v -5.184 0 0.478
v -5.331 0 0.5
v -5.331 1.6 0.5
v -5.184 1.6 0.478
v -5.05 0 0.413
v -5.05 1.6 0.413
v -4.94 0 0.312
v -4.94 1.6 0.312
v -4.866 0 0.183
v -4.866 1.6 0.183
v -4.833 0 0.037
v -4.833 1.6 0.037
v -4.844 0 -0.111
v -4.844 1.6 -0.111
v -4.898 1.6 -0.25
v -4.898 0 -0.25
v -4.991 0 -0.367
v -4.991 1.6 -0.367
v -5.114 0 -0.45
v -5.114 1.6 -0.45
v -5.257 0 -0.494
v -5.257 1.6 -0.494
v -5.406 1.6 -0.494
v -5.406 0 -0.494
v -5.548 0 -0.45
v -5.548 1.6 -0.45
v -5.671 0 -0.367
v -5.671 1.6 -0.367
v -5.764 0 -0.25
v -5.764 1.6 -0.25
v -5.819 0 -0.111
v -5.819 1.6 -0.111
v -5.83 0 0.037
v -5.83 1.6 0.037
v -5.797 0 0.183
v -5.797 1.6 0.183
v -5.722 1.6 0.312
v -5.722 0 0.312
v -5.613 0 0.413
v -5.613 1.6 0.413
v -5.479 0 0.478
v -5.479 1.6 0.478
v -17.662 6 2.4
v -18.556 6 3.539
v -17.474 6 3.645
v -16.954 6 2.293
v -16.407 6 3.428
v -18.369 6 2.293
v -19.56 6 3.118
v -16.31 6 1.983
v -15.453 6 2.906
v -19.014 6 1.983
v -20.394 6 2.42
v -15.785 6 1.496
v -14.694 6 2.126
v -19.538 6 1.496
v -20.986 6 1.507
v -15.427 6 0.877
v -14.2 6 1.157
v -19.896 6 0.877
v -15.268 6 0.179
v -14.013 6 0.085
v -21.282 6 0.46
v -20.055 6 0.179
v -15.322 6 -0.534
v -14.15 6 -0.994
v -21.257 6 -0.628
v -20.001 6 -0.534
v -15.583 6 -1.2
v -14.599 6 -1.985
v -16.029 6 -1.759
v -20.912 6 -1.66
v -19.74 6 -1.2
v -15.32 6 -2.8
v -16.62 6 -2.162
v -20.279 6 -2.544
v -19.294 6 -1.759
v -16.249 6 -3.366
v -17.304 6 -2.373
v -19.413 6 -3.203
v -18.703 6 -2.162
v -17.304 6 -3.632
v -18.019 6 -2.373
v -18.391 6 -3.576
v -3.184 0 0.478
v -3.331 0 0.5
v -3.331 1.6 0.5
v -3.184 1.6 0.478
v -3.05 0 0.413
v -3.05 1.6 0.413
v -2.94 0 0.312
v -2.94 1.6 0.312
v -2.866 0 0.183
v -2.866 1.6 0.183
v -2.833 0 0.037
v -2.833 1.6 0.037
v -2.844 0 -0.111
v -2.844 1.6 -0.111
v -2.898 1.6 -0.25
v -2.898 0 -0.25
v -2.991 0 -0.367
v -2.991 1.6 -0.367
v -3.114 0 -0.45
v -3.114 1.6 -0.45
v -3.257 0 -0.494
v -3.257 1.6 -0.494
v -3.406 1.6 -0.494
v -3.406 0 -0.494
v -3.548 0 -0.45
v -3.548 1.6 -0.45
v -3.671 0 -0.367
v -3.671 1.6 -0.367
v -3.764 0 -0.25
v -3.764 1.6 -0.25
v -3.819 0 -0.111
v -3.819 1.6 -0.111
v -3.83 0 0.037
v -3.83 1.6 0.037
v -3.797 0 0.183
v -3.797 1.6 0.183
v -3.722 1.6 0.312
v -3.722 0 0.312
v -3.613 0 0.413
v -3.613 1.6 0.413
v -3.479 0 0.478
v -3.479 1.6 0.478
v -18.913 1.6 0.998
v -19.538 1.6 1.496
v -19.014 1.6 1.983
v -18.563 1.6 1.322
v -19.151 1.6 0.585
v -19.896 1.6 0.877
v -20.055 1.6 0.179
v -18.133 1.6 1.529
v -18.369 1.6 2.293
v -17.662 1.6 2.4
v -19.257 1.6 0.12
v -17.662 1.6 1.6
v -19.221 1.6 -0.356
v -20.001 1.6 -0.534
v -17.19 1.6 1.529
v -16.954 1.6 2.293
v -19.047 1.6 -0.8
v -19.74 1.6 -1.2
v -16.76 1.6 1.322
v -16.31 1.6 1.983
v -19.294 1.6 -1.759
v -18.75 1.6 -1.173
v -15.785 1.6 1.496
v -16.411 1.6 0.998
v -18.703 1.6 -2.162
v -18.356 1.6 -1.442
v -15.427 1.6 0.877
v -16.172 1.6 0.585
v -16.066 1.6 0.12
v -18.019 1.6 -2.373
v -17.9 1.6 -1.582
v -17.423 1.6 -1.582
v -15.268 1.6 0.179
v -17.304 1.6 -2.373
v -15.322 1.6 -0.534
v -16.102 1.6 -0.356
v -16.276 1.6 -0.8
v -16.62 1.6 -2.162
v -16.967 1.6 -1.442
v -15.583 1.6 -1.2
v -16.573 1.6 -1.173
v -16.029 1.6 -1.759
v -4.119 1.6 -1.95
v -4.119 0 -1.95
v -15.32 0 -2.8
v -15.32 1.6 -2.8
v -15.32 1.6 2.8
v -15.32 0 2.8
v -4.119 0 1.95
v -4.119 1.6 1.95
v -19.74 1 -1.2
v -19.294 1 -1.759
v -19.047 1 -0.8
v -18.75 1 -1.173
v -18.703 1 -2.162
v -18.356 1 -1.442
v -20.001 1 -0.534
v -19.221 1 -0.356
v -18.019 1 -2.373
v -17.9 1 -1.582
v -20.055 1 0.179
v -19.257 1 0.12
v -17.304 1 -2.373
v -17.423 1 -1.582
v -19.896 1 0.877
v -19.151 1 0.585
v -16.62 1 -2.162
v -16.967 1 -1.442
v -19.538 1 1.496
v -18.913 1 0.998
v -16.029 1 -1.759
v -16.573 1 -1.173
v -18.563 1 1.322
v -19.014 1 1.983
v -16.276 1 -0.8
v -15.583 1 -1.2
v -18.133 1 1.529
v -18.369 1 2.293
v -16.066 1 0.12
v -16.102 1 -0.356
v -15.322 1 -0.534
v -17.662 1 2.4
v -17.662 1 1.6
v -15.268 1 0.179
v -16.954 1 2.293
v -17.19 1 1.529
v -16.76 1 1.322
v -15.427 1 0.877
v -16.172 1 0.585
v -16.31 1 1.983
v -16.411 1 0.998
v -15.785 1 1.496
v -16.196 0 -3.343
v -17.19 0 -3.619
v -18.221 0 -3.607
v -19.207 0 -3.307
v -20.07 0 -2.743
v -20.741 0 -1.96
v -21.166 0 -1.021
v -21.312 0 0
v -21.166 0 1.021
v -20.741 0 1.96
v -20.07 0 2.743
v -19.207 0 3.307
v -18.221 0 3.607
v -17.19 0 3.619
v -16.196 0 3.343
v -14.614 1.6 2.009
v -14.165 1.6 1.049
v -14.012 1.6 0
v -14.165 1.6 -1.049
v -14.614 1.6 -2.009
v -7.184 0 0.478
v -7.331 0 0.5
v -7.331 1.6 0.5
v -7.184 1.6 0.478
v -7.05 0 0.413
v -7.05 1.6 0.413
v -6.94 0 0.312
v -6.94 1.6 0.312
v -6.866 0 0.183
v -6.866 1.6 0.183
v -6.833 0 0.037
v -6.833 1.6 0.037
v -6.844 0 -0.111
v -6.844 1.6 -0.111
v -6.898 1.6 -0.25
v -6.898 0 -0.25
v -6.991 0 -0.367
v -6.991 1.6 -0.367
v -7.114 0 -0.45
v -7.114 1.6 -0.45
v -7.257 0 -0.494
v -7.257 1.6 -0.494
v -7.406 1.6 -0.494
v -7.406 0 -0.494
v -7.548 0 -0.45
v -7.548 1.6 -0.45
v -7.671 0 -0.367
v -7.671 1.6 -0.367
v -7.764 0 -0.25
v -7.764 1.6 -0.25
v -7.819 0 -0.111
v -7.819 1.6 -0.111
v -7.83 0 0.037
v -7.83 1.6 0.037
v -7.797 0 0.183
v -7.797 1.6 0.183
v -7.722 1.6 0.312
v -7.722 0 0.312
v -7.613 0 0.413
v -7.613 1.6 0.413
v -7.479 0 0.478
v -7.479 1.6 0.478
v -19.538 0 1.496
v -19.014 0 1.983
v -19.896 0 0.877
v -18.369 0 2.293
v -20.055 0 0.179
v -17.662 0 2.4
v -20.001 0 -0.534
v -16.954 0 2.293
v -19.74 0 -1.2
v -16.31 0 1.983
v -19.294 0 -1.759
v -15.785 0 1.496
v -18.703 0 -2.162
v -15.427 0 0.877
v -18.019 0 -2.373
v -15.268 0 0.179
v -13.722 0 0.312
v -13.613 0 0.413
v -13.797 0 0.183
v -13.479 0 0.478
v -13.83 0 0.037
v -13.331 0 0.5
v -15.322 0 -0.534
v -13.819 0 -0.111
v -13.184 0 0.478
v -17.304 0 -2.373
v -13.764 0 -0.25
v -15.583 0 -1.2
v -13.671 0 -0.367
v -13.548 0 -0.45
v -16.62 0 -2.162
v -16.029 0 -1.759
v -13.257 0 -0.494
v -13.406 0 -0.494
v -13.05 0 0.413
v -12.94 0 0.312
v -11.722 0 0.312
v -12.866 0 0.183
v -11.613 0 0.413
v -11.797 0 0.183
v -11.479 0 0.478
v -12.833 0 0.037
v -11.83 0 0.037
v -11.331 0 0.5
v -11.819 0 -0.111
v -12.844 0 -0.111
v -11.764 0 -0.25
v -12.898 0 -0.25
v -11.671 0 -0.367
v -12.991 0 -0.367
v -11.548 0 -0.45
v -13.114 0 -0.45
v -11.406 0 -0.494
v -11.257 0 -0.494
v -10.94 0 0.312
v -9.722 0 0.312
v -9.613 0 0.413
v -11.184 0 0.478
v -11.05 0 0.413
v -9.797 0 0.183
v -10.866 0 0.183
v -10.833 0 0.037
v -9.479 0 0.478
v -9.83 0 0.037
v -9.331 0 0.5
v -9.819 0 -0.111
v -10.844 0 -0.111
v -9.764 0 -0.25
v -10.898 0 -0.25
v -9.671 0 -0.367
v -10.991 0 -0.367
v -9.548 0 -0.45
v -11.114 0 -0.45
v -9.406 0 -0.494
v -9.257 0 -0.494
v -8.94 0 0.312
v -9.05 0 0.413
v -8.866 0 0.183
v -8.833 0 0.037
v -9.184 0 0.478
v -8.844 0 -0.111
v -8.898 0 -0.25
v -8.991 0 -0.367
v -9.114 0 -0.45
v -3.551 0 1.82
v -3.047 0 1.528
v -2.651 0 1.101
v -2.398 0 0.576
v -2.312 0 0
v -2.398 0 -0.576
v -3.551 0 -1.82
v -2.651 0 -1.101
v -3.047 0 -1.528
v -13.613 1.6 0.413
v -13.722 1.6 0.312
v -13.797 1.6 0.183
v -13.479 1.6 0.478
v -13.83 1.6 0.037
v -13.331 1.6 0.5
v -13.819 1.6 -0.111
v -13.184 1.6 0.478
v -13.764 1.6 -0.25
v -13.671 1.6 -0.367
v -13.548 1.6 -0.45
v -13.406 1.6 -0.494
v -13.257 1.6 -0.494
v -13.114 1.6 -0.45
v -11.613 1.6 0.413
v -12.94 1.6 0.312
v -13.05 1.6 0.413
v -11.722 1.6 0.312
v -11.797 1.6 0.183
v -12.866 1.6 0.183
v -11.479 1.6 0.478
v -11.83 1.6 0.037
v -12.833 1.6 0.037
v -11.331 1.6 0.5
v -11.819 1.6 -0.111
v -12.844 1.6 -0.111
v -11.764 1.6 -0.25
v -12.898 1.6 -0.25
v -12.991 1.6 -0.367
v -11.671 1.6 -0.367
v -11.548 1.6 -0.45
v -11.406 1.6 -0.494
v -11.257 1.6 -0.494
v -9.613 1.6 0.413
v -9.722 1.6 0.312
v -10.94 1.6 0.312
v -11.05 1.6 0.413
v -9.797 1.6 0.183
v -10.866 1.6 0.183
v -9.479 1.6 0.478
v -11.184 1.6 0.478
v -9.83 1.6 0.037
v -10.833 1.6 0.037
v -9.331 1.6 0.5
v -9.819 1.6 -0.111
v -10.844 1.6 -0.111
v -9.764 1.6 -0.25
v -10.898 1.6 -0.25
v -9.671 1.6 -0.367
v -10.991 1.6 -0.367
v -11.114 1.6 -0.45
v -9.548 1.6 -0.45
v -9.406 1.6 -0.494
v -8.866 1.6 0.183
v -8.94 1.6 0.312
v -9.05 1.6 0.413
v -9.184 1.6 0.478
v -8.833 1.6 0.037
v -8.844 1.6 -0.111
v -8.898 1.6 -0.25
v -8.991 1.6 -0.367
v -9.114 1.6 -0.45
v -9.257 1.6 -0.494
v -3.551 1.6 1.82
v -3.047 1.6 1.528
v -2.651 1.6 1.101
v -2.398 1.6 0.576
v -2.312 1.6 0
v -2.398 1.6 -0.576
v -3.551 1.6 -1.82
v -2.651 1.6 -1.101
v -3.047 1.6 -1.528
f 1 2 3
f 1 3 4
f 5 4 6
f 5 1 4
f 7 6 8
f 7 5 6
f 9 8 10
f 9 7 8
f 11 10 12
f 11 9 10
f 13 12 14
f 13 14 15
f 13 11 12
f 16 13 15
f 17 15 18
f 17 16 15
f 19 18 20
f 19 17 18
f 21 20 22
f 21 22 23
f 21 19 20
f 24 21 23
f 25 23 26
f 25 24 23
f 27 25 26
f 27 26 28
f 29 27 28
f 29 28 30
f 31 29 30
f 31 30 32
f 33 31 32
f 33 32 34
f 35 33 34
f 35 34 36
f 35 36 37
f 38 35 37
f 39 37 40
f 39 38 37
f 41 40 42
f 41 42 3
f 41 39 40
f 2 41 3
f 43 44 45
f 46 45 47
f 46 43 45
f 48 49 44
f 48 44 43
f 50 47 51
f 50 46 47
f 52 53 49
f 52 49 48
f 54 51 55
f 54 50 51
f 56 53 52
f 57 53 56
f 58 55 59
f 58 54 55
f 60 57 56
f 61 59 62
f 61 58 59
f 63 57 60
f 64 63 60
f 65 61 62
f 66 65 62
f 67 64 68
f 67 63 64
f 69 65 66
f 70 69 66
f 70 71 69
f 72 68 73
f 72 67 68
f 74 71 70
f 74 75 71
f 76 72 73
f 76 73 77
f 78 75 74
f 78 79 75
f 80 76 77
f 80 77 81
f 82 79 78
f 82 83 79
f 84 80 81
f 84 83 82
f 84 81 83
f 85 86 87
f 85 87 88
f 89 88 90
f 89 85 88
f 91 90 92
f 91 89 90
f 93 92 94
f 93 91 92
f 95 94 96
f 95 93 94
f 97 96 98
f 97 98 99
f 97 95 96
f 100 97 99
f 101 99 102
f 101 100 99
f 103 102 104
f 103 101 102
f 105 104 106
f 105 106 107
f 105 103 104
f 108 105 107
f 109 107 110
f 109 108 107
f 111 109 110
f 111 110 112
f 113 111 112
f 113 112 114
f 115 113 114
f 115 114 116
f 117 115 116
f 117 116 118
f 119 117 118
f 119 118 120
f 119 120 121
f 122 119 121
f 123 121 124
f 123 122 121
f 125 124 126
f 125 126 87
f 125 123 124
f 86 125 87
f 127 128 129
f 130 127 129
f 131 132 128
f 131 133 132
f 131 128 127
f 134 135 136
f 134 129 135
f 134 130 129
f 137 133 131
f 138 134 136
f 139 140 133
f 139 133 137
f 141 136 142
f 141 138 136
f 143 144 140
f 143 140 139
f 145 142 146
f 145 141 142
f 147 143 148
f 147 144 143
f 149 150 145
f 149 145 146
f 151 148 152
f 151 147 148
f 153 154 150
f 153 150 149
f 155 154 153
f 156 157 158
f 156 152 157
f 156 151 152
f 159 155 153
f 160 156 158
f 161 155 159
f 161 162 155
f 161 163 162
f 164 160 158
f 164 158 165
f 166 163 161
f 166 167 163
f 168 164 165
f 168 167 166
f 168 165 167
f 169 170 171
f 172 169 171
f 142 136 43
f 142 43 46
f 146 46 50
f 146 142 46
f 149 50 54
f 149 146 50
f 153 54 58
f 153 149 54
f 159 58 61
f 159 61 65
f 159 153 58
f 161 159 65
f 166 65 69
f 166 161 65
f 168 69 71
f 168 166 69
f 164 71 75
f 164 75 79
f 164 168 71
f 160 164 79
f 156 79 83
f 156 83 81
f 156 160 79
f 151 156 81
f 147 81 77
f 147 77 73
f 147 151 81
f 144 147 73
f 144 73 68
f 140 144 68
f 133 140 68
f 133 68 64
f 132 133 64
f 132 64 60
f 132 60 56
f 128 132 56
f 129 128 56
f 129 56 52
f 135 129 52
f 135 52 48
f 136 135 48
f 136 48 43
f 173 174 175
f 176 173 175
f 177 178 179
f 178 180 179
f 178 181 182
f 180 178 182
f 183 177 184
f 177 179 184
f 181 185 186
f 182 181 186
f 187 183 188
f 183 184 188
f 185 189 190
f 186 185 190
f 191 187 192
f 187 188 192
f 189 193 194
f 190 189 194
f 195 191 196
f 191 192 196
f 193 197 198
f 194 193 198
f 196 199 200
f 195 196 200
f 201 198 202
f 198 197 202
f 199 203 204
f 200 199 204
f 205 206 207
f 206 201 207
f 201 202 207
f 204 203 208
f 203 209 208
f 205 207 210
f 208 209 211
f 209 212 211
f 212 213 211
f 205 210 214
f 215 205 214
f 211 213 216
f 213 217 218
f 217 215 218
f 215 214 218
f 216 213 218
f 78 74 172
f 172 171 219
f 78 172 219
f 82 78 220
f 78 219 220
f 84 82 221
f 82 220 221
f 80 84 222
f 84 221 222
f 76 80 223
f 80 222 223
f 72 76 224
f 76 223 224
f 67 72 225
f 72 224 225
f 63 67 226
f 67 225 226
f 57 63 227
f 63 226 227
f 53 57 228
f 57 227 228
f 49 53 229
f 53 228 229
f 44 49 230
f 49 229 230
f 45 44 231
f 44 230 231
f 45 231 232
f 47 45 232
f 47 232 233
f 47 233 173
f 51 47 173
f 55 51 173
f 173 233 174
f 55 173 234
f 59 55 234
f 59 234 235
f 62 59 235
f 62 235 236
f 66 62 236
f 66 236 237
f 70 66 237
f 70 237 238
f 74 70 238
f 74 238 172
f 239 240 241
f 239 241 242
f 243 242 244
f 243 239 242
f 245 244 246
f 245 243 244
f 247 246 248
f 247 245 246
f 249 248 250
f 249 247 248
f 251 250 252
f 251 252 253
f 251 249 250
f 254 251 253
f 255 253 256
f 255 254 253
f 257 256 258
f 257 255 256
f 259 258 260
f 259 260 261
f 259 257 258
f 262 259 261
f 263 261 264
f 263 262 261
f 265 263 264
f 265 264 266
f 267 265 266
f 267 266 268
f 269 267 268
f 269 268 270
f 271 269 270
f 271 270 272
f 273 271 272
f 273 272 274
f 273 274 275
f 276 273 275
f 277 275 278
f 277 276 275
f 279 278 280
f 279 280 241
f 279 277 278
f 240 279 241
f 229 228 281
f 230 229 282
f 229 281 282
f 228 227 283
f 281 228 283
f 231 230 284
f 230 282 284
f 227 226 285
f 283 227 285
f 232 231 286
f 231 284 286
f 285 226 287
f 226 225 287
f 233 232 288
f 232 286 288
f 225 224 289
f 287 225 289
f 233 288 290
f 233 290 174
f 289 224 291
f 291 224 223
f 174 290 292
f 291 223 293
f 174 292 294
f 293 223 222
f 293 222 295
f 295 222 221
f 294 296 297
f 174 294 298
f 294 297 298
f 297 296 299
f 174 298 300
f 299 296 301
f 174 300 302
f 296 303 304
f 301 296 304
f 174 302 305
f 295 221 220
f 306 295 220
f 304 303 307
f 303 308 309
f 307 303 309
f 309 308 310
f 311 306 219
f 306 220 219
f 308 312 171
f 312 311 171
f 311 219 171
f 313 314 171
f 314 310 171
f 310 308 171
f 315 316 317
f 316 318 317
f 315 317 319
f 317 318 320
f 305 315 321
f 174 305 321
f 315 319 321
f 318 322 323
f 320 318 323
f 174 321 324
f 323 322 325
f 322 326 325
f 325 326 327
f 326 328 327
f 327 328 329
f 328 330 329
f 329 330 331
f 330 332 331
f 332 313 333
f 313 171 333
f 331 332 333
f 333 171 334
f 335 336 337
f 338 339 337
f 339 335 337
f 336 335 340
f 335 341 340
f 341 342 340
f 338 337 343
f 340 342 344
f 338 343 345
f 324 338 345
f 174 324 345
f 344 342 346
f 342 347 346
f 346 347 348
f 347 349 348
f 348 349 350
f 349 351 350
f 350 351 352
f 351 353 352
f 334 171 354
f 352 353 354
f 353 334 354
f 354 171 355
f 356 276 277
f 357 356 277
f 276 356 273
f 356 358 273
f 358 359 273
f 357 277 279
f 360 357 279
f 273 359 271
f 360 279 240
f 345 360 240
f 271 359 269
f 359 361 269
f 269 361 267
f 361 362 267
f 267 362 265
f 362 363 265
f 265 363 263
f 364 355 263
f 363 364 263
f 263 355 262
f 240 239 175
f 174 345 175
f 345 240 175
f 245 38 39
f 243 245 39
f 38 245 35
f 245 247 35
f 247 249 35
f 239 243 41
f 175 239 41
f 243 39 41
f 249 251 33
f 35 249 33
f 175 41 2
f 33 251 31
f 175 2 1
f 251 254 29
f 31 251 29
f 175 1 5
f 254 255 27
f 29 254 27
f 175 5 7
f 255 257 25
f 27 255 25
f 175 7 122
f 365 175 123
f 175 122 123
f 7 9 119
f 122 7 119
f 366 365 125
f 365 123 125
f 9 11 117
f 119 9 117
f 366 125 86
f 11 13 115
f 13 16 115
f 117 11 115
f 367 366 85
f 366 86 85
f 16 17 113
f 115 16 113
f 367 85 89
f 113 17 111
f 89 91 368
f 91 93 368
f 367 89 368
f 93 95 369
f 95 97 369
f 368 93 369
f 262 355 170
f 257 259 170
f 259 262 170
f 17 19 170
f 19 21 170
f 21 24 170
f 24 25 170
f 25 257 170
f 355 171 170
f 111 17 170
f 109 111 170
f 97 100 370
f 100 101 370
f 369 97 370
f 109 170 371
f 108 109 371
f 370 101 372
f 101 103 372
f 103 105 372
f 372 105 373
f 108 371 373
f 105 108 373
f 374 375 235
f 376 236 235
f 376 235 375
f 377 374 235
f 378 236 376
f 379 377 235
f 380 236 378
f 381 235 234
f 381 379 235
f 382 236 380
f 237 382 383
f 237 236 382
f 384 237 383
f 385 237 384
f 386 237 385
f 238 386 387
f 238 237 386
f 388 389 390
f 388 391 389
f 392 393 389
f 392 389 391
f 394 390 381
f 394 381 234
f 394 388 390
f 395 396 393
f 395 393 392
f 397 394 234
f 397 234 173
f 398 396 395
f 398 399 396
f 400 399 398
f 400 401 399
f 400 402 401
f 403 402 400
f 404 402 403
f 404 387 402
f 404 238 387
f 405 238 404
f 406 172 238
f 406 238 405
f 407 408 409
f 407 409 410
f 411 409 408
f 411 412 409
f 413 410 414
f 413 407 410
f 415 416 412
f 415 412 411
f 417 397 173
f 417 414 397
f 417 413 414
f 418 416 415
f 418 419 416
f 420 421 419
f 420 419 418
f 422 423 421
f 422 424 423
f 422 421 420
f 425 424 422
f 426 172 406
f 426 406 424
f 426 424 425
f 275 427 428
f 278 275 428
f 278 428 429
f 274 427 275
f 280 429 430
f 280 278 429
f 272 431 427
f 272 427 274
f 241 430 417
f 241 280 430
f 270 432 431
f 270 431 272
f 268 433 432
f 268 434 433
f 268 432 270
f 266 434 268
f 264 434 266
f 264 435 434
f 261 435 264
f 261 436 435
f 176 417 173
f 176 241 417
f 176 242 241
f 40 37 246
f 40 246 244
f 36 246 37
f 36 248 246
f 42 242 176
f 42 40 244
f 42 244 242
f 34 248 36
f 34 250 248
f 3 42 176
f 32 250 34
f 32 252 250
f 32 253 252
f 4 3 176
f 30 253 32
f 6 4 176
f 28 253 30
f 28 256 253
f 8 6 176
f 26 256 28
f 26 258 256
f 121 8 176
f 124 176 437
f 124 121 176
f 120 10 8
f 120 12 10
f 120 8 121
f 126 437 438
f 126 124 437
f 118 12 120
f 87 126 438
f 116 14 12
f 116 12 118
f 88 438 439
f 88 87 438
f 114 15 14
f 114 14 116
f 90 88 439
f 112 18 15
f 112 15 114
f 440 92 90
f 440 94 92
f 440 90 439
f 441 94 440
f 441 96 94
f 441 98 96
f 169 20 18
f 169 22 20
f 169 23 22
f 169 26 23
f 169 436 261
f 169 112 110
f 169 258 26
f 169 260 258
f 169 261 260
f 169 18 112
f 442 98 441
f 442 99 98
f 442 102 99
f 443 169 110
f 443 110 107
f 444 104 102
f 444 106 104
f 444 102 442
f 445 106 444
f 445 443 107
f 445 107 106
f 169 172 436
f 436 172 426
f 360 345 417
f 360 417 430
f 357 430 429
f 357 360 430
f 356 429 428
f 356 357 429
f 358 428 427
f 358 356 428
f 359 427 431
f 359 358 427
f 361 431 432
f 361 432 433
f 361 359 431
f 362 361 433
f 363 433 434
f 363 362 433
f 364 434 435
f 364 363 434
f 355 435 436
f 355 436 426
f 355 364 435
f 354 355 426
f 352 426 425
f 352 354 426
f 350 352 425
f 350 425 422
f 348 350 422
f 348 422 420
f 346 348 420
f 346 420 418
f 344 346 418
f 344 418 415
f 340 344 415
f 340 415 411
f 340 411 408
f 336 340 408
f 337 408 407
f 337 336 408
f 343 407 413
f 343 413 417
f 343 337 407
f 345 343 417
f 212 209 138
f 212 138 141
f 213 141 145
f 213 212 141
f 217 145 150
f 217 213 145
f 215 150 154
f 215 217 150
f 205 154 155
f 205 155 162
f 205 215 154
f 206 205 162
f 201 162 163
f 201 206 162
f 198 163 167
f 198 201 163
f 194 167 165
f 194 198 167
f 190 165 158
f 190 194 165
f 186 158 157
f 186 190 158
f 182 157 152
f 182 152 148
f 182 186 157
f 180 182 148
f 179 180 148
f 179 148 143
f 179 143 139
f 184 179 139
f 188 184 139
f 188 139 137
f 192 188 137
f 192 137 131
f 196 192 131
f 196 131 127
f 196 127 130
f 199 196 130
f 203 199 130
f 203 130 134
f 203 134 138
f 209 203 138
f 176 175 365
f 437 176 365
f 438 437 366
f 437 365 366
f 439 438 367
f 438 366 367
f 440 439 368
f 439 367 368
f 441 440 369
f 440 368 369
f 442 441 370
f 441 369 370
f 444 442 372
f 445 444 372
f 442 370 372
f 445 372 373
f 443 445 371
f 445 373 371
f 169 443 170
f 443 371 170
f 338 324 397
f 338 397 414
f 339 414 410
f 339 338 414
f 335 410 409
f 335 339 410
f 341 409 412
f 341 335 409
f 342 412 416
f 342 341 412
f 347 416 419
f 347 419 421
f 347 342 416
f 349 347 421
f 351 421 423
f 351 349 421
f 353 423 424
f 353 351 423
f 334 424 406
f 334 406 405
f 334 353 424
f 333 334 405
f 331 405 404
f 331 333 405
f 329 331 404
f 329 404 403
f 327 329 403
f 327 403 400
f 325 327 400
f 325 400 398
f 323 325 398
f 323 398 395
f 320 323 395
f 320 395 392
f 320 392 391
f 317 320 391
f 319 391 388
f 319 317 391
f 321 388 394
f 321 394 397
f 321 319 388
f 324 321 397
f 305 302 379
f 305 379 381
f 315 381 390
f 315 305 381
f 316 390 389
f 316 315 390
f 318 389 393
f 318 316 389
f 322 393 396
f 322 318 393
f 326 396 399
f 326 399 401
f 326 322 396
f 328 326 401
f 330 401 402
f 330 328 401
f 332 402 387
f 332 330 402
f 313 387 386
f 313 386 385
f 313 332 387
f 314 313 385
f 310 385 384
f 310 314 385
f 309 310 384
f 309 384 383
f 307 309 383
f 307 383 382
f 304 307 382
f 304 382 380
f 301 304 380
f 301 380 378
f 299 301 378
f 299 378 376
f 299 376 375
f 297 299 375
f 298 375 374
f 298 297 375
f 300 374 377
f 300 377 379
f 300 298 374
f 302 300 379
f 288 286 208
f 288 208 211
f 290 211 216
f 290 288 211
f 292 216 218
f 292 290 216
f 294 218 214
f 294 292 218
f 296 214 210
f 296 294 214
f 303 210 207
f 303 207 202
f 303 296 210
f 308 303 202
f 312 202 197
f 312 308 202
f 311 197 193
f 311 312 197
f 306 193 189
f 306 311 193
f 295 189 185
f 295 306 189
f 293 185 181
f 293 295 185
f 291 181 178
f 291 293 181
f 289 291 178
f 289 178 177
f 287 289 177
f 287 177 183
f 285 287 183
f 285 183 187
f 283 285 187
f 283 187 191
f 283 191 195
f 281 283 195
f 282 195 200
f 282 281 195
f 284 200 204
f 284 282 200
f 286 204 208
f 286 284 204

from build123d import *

# Parameters (mm, degrees)
SKETCH1_R           = 3.65
SKETCH1_R_2         = 2.4
SKETCH1_R_3         = 1.6
SKETCH1_R_4         = 0.5
BOSS_EXTRUDE1_DEPTH = 1.6
SKETCH1_3_R         = 3.65
SKETCH1_3_R_2       = 2.4
BOSS_EXTRUDE2_DEPTH = 6
SKETCH1_4_R         = 2.4
SKETCH1_4_R_2       = 1.6
CUT_EXTRUDE1_DEPTH  = 1


with BuildPart() as part:
    # Sketch1 → Boss-Extrude1 (new body)
    # profile 1 of 3: a face of its own
    with BuildSketch(Plane(origin=(0, 0, 0), x_dir=(1, 0, 0), z_dir=(0, 1, 0))):
        with Locations((-17.661574497, 0)):
            Circle(SKETCH1_R)
        with Locations((-17.661574497, 0)):
            Circle(SKETCH1_R_2, mode=Mode.SUBTRACT)
    # profile 2 of 3: a face of its own
    with BuildSketch(Plane(origin=(0, 0, 0), x_dir=(1, 0, 0), z_dir=(0, 1, 0))):
        with Locations((-17.661574497, 0)):
            Circle(SKETCH1_R_2)
        with Locations(Location((-17.661574497, 0, 0), (0, 0, 270))):
            Circle(SKETCH1_R_3, mode=Mode.SUBTRACT)
    # profile 3 of 3: a face of its own
    with BuildSketch(Plane(origin=(0, 0, 0), x_dir=(1, 0, 0), z_dir=(0, 1, 0))):
        with BuildLine():
            Line((-4.119202068, 1.95), (-15.320100602, 2.8))
            ThreePointArc((-15.320100602, 2.8), (-14.35484804, 1.545334961), (-14.011574497, 0))
            ThreePointArc((-14.011574497, 0), (-14.35484804, -1.545334961), (-15.320100602, -2.8))
            Line((-15.320100602, -2.8), (-4.119202068, -1.95))
            ThreePointArc((-4.119202068, -1.95), (-2.311574497, 0), (-4.119202068, 1.95))
        make_face()
        with Locations(Location((-13.331400804, 0, 0), (0, 0, 270))):
            Circle(SKETCH1_R_4, mode=Mode.SUBTRACT)
        with Locations(Location((-11.331400804, 0, 0), (0, 0, 270))):
            Circle(SKETCH1_R_4, mode=Mode.SUBTRACT)
        with Locations(Location((-9.331400804, 0, 0), (0, 0, 270))):
            Circle(SKETCH1_R_4, mode=Mode.SUBTRACT)
        with Locations(Location((-7.331400804, 0, 0), (0, 0, 270))):
            Circle(SKETCH1_R_4, mode=Mode.SUBTRACT)
        with Locations(Location((-5.331400804, 0, 0), (0, 0, 270))):
            Circle(SKETCH1_R_4, mode=Mode.SUBTRACT)
        with Locations(Location((-3.331400804, 0, 0), (0, 0, 270))):
            Circle(SKETCH1_R_4, mode=Mode.SUBTRACT)
    extrude(amount=BOSS_EXTRUDE1_DEPTH)

    # Sketch1<3> → Boss-Extrude2 (add)
    with BuildSketch(Plane(origin=(0, 0, 0), x_dir=(1, 0, 0), z_dir=(0, 1, 0))):
        with Locations(Location((-17.661574497, 0, 0), (0, 0, 50.096260743))):
            Circle(SKETCH1_3_R)
        with Locations(Location((-17.661574497, 0, 0), (0, 0, 270))):
            Circle(SKETCH1_3_R_2, mode=Mode.SUBTRACT)
    extrude(amount=BOSS_EXTRUDE2_DEPTH)

    # Sketch1<4> → Cut-Extrude1 (cut)
    with BuildSketch(Plane(origin=(0, 0, 0), x_dir=(1, 0, 0), z_dir=(0, 1, 0))):
        with Locations(Location((-17.661574497, 0, 0), (0, 0, 270))):
            Circle(SKETCH1_4_R)
        with Locations(Location((-17.661574497, 0, 0), (0, 0, 270))):
            Circle(SKETCH1_4_R_2, mode=Mode.SUBTRACT)
    extrude(amount=CUT_EXTRUDE1_DEPTH, mode=Mode.SUBTRACT)


solid = part.part
